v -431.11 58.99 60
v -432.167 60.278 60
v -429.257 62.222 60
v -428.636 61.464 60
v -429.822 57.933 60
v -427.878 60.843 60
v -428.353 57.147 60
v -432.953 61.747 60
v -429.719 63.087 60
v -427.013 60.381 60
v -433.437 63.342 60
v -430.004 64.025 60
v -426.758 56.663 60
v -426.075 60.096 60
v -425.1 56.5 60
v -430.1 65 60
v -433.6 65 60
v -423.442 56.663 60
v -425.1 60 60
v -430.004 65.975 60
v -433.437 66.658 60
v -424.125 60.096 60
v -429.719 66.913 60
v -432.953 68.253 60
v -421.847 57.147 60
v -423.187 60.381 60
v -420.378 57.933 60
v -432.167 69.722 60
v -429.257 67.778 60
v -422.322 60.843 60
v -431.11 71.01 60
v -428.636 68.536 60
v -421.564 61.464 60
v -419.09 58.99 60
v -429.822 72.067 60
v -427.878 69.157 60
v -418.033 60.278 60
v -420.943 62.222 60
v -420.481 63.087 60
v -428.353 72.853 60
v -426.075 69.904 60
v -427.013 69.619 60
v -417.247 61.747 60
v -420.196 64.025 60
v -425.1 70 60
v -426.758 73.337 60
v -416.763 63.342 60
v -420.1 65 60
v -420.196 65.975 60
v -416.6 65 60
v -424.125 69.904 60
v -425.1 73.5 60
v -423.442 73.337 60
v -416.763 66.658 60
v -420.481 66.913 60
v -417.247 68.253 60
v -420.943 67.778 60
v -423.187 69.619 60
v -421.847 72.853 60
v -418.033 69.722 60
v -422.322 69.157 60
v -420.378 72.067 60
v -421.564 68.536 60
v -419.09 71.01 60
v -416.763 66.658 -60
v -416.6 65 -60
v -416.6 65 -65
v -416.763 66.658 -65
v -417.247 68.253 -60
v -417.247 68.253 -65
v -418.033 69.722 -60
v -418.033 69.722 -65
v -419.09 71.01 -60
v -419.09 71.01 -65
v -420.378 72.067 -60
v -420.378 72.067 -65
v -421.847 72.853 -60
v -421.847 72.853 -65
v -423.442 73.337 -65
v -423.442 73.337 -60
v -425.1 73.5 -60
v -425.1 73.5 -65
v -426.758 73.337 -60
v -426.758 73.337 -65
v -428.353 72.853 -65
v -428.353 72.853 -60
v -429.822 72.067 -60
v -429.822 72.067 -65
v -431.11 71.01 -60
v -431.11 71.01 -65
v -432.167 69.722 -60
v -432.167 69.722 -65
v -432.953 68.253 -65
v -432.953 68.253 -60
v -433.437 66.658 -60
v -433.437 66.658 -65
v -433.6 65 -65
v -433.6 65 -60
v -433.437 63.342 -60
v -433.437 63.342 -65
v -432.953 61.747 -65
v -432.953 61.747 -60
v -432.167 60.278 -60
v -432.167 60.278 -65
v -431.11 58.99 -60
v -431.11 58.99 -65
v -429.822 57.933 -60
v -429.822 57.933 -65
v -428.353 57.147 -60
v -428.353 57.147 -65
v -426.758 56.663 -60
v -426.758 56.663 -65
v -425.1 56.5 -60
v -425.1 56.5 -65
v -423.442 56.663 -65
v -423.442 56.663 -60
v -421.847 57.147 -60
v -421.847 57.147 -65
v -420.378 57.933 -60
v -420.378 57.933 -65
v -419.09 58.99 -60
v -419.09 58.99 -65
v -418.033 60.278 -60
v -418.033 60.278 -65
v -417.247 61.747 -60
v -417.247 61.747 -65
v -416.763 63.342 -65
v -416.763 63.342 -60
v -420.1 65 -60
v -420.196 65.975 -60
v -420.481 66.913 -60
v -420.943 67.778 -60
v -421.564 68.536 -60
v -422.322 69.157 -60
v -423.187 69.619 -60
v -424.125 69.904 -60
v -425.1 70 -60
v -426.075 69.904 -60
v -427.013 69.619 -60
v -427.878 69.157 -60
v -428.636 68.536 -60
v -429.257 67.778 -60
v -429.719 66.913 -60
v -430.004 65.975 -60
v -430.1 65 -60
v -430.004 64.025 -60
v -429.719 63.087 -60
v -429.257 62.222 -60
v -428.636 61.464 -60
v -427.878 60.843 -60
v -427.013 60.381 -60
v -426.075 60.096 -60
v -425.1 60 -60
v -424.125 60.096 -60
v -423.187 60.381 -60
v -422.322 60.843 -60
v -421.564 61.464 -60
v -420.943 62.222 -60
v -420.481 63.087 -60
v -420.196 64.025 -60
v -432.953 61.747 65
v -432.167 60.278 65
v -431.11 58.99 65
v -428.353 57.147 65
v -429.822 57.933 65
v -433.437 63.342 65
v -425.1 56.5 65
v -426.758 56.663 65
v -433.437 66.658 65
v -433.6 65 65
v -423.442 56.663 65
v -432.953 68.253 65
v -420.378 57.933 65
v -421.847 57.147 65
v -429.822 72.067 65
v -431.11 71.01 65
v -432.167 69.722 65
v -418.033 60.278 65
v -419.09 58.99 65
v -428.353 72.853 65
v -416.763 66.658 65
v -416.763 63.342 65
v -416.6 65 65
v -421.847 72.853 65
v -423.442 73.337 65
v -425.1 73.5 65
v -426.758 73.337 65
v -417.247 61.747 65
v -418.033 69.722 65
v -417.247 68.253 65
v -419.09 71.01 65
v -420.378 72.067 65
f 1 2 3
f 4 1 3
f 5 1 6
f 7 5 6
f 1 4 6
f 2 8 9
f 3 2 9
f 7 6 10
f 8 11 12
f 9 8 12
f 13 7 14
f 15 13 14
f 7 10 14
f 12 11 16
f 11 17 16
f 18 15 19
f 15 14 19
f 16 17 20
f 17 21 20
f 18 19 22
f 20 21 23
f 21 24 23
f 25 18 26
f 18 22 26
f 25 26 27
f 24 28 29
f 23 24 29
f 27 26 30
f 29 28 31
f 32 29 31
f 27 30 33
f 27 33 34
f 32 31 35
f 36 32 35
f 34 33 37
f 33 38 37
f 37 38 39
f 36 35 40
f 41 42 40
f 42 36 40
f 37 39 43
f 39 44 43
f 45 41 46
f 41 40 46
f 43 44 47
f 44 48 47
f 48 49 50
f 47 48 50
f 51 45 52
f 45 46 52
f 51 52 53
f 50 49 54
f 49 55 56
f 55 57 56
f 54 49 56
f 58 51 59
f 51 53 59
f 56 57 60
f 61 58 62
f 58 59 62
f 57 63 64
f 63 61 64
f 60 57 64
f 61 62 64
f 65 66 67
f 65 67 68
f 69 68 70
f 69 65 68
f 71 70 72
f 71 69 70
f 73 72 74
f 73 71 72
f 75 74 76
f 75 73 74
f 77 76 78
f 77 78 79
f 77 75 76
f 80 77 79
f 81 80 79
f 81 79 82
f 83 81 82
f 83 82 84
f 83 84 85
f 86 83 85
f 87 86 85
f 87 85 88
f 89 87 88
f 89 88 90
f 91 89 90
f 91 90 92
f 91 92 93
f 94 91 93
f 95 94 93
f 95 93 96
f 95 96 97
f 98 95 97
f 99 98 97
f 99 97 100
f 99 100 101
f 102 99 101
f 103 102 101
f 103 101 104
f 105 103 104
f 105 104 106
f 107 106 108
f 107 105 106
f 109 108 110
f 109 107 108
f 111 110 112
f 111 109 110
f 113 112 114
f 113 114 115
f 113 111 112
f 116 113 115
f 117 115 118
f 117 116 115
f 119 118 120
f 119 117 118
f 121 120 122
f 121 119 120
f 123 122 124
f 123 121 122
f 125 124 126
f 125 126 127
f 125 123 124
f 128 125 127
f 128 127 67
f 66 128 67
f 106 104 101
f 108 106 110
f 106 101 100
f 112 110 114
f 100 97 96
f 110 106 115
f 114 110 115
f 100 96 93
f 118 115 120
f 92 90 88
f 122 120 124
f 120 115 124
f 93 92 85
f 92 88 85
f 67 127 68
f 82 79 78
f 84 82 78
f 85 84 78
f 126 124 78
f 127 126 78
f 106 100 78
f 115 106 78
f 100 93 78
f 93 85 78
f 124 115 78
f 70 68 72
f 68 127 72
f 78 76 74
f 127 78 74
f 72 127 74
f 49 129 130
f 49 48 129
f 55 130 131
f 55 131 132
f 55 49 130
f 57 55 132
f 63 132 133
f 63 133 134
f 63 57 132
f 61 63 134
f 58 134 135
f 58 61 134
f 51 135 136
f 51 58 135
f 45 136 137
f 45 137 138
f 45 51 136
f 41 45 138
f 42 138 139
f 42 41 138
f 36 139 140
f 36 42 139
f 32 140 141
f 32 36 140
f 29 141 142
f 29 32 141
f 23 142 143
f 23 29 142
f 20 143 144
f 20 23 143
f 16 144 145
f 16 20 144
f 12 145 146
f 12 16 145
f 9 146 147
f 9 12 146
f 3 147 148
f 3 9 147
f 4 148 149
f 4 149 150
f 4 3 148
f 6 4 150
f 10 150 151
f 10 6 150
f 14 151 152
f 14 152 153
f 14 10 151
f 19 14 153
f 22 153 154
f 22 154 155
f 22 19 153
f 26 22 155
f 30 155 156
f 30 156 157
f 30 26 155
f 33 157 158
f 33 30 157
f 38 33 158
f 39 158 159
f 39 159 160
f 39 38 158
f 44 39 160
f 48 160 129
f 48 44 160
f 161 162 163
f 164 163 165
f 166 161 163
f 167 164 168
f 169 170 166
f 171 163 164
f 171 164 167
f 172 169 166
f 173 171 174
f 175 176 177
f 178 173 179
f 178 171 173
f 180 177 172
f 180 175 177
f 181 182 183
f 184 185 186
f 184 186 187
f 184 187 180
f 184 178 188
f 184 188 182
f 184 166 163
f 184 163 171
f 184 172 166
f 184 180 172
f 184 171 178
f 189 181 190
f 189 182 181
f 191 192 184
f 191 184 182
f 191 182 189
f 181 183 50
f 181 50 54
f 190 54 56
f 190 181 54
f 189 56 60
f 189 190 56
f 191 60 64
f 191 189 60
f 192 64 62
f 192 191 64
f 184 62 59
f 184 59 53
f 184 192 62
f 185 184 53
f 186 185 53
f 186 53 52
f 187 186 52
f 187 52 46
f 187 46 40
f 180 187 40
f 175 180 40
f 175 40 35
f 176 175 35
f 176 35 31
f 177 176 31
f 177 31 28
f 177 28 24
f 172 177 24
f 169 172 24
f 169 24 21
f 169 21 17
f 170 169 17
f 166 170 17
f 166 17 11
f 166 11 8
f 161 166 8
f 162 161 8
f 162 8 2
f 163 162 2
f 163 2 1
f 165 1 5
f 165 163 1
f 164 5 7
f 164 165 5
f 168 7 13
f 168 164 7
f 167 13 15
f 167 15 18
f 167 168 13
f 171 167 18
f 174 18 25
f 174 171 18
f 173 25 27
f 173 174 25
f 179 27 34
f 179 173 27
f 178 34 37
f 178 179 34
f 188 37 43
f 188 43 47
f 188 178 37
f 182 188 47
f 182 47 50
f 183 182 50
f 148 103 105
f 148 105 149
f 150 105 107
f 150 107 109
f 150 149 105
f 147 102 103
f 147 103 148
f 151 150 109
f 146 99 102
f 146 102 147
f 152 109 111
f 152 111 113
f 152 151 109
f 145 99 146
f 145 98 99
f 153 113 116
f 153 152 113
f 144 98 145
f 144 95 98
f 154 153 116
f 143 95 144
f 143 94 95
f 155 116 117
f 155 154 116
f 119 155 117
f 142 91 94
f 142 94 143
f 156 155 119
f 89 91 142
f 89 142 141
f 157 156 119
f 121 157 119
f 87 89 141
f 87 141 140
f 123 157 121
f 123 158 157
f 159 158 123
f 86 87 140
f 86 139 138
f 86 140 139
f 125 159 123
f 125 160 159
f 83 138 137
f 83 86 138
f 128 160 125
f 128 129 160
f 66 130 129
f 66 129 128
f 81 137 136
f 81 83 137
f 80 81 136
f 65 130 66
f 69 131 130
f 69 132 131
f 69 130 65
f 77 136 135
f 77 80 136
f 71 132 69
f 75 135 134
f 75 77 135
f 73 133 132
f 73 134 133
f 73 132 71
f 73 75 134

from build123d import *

# Parameters (mm, degrees)
EJE_PROFILE_R         = 5
TUERCA_DCHA_PROFILE_R = 8.5
TUERCA_IZQ_PROFILE_R  = 8.5


with BuildPart() as part:
    # Eje: sweep along a curve in space
    with BuildLine() as eje_path:
        Line((-425.1, 65, -65), (-425.1, 65, 65))
    # Eje profile (on start of the path) → Eje (sweep)
    with BuildSketch(Plane(origin=(-425.1, 65, -65), x_dir=(1, 0, 0), z_dir=(0, 0, 1))):
        Circle(EJE_PROFILE_R)
    sweep(path=eje_path.line)

    # Tuerca_dcha: sweep along a curve in space
    with BuildLine() as tuerca_dcha_path:
        Line((-425.1, 65, 60), (-425.1, 65, 65))
    # Tuerca_dcha profile (on start of the path) → Tuerca_dcha (sweep)
    with BuildSketch(Plane(origin=(-425.1, 65, 60), x_dir=(1, 0, 0), z_dir=(0, 0, 1))):
        Circle(TUERCA_DCHA_PROFILE_R)
    sweep(path=tuerca_dcha_path.line)

    # Tuerca_izq: sweep along a curve in space
    with BuildLine() as tuerca_izq_path:
        Line((-425.1, 65, -65), (-425.1, 65, -60))
    # Tuerca_izq profile (on start of the path) → Tuerca_izq (sweep)
    with BuildSketch(Plane(origin=(-425.1, 65, -65), x_dir=(1, 0, 0), z_dir=(0, 0, 1))):
        Circle(TUERCA_IZQ_PROFILE_R)
    sweep(path=tuerca_izq_path.line)


solid = part.part
